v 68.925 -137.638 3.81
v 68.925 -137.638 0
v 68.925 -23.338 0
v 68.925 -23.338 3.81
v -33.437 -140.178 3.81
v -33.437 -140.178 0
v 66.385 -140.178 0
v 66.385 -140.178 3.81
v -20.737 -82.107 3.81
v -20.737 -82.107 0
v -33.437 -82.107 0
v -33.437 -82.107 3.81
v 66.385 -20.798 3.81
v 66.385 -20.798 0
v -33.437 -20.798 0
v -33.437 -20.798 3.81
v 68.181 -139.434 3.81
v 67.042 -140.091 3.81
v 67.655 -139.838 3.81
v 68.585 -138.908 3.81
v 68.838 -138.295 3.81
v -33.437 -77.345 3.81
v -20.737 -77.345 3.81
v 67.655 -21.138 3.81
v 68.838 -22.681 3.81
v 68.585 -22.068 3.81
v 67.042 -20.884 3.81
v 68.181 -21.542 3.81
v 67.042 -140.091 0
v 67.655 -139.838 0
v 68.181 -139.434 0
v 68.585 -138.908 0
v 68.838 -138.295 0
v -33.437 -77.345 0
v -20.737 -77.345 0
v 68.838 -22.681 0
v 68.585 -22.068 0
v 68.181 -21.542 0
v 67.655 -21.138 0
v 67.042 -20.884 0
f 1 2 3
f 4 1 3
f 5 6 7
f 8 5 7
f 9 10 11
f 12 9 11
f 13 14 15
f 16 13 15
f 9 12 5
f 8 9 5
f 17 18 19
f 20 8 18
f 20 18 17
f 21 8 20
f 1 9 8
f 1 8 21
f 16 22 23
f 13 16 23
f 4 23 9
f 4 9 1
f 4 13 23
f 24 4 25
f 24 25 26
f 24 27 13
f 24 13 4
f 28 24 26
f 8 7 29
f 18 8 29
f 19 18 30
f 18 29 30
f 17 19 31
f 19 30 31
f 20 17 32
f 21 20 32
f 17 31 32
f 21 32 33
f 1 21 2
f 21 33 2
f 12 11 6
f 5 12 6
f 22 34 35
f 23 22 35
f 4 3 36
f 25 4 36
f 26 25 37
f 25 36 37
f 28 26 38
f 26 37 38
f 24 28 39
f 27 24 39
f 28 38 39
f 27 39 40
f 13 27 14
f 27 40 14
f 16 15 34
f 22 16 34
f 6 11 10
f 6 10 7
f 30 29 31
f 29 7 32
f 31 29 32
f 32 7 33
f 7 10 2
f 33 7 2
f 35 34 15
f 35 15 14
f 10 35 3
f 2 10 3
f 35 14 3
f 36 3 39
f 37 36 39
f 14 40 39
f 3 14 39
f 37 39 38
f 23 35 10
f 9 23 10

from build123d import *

# Parameters (mm, degrees)
BOSS_EXTRUDE1_DEPTH = 3.81


with BuildPart() as part:
    # Sketch1 → Boss-Extrude1 (new body)
    with BuildSketch(Plane.XY):
        with BuildLine():
            Line((66.385047378, -20.797940286), (39.917099653, -20.797940286))
            Line((39.917099653, -20.797940286), (-33.436952622, -20.797940286))
            Line((-33.436952622, -20.797940286), (-33.436952622, -68.922192769))
            Line((-33.436952622, -68.922192769), (-33.436952622, -77.344690286))
            Line((-33.436952622, -77.344690286), (-20.736952622, -77.344690286))
            Line((-20.736952622, -77.344690286), (-20.736952622, -82.107190286))
            Line((-20.736952622, -82.107190286), (-33.436952622, -82.107190286))
            Line((-33.436952622, -82.107190286), (-33.436952622, -140.177940286))
            Line((-33.436952622, -140.177940286), (2.135249773, -140.177940286))
            Line((2.135249773, -140.177940286), (66.385047378, -140.177940286))
            ThreePointArc((66.385047378, -140.177940286), (68.181098603, -139.43399151), (68.925047378, -137.637940286))
            Line((68.925047378, -137.637940286), (68.925047378, -80.487940286))
            Line((68.925047378, -80.487940286), (68.925047378, -23.337940286))
            ThreePointArc((68.925047378, -23.337940286), (68.181098603, -21.541889062), (66.385047378, -20.797940286))
        make_face()
    extrude(amount=BOSS_EXTRUDE1_DEPTH)


solid = part.part
